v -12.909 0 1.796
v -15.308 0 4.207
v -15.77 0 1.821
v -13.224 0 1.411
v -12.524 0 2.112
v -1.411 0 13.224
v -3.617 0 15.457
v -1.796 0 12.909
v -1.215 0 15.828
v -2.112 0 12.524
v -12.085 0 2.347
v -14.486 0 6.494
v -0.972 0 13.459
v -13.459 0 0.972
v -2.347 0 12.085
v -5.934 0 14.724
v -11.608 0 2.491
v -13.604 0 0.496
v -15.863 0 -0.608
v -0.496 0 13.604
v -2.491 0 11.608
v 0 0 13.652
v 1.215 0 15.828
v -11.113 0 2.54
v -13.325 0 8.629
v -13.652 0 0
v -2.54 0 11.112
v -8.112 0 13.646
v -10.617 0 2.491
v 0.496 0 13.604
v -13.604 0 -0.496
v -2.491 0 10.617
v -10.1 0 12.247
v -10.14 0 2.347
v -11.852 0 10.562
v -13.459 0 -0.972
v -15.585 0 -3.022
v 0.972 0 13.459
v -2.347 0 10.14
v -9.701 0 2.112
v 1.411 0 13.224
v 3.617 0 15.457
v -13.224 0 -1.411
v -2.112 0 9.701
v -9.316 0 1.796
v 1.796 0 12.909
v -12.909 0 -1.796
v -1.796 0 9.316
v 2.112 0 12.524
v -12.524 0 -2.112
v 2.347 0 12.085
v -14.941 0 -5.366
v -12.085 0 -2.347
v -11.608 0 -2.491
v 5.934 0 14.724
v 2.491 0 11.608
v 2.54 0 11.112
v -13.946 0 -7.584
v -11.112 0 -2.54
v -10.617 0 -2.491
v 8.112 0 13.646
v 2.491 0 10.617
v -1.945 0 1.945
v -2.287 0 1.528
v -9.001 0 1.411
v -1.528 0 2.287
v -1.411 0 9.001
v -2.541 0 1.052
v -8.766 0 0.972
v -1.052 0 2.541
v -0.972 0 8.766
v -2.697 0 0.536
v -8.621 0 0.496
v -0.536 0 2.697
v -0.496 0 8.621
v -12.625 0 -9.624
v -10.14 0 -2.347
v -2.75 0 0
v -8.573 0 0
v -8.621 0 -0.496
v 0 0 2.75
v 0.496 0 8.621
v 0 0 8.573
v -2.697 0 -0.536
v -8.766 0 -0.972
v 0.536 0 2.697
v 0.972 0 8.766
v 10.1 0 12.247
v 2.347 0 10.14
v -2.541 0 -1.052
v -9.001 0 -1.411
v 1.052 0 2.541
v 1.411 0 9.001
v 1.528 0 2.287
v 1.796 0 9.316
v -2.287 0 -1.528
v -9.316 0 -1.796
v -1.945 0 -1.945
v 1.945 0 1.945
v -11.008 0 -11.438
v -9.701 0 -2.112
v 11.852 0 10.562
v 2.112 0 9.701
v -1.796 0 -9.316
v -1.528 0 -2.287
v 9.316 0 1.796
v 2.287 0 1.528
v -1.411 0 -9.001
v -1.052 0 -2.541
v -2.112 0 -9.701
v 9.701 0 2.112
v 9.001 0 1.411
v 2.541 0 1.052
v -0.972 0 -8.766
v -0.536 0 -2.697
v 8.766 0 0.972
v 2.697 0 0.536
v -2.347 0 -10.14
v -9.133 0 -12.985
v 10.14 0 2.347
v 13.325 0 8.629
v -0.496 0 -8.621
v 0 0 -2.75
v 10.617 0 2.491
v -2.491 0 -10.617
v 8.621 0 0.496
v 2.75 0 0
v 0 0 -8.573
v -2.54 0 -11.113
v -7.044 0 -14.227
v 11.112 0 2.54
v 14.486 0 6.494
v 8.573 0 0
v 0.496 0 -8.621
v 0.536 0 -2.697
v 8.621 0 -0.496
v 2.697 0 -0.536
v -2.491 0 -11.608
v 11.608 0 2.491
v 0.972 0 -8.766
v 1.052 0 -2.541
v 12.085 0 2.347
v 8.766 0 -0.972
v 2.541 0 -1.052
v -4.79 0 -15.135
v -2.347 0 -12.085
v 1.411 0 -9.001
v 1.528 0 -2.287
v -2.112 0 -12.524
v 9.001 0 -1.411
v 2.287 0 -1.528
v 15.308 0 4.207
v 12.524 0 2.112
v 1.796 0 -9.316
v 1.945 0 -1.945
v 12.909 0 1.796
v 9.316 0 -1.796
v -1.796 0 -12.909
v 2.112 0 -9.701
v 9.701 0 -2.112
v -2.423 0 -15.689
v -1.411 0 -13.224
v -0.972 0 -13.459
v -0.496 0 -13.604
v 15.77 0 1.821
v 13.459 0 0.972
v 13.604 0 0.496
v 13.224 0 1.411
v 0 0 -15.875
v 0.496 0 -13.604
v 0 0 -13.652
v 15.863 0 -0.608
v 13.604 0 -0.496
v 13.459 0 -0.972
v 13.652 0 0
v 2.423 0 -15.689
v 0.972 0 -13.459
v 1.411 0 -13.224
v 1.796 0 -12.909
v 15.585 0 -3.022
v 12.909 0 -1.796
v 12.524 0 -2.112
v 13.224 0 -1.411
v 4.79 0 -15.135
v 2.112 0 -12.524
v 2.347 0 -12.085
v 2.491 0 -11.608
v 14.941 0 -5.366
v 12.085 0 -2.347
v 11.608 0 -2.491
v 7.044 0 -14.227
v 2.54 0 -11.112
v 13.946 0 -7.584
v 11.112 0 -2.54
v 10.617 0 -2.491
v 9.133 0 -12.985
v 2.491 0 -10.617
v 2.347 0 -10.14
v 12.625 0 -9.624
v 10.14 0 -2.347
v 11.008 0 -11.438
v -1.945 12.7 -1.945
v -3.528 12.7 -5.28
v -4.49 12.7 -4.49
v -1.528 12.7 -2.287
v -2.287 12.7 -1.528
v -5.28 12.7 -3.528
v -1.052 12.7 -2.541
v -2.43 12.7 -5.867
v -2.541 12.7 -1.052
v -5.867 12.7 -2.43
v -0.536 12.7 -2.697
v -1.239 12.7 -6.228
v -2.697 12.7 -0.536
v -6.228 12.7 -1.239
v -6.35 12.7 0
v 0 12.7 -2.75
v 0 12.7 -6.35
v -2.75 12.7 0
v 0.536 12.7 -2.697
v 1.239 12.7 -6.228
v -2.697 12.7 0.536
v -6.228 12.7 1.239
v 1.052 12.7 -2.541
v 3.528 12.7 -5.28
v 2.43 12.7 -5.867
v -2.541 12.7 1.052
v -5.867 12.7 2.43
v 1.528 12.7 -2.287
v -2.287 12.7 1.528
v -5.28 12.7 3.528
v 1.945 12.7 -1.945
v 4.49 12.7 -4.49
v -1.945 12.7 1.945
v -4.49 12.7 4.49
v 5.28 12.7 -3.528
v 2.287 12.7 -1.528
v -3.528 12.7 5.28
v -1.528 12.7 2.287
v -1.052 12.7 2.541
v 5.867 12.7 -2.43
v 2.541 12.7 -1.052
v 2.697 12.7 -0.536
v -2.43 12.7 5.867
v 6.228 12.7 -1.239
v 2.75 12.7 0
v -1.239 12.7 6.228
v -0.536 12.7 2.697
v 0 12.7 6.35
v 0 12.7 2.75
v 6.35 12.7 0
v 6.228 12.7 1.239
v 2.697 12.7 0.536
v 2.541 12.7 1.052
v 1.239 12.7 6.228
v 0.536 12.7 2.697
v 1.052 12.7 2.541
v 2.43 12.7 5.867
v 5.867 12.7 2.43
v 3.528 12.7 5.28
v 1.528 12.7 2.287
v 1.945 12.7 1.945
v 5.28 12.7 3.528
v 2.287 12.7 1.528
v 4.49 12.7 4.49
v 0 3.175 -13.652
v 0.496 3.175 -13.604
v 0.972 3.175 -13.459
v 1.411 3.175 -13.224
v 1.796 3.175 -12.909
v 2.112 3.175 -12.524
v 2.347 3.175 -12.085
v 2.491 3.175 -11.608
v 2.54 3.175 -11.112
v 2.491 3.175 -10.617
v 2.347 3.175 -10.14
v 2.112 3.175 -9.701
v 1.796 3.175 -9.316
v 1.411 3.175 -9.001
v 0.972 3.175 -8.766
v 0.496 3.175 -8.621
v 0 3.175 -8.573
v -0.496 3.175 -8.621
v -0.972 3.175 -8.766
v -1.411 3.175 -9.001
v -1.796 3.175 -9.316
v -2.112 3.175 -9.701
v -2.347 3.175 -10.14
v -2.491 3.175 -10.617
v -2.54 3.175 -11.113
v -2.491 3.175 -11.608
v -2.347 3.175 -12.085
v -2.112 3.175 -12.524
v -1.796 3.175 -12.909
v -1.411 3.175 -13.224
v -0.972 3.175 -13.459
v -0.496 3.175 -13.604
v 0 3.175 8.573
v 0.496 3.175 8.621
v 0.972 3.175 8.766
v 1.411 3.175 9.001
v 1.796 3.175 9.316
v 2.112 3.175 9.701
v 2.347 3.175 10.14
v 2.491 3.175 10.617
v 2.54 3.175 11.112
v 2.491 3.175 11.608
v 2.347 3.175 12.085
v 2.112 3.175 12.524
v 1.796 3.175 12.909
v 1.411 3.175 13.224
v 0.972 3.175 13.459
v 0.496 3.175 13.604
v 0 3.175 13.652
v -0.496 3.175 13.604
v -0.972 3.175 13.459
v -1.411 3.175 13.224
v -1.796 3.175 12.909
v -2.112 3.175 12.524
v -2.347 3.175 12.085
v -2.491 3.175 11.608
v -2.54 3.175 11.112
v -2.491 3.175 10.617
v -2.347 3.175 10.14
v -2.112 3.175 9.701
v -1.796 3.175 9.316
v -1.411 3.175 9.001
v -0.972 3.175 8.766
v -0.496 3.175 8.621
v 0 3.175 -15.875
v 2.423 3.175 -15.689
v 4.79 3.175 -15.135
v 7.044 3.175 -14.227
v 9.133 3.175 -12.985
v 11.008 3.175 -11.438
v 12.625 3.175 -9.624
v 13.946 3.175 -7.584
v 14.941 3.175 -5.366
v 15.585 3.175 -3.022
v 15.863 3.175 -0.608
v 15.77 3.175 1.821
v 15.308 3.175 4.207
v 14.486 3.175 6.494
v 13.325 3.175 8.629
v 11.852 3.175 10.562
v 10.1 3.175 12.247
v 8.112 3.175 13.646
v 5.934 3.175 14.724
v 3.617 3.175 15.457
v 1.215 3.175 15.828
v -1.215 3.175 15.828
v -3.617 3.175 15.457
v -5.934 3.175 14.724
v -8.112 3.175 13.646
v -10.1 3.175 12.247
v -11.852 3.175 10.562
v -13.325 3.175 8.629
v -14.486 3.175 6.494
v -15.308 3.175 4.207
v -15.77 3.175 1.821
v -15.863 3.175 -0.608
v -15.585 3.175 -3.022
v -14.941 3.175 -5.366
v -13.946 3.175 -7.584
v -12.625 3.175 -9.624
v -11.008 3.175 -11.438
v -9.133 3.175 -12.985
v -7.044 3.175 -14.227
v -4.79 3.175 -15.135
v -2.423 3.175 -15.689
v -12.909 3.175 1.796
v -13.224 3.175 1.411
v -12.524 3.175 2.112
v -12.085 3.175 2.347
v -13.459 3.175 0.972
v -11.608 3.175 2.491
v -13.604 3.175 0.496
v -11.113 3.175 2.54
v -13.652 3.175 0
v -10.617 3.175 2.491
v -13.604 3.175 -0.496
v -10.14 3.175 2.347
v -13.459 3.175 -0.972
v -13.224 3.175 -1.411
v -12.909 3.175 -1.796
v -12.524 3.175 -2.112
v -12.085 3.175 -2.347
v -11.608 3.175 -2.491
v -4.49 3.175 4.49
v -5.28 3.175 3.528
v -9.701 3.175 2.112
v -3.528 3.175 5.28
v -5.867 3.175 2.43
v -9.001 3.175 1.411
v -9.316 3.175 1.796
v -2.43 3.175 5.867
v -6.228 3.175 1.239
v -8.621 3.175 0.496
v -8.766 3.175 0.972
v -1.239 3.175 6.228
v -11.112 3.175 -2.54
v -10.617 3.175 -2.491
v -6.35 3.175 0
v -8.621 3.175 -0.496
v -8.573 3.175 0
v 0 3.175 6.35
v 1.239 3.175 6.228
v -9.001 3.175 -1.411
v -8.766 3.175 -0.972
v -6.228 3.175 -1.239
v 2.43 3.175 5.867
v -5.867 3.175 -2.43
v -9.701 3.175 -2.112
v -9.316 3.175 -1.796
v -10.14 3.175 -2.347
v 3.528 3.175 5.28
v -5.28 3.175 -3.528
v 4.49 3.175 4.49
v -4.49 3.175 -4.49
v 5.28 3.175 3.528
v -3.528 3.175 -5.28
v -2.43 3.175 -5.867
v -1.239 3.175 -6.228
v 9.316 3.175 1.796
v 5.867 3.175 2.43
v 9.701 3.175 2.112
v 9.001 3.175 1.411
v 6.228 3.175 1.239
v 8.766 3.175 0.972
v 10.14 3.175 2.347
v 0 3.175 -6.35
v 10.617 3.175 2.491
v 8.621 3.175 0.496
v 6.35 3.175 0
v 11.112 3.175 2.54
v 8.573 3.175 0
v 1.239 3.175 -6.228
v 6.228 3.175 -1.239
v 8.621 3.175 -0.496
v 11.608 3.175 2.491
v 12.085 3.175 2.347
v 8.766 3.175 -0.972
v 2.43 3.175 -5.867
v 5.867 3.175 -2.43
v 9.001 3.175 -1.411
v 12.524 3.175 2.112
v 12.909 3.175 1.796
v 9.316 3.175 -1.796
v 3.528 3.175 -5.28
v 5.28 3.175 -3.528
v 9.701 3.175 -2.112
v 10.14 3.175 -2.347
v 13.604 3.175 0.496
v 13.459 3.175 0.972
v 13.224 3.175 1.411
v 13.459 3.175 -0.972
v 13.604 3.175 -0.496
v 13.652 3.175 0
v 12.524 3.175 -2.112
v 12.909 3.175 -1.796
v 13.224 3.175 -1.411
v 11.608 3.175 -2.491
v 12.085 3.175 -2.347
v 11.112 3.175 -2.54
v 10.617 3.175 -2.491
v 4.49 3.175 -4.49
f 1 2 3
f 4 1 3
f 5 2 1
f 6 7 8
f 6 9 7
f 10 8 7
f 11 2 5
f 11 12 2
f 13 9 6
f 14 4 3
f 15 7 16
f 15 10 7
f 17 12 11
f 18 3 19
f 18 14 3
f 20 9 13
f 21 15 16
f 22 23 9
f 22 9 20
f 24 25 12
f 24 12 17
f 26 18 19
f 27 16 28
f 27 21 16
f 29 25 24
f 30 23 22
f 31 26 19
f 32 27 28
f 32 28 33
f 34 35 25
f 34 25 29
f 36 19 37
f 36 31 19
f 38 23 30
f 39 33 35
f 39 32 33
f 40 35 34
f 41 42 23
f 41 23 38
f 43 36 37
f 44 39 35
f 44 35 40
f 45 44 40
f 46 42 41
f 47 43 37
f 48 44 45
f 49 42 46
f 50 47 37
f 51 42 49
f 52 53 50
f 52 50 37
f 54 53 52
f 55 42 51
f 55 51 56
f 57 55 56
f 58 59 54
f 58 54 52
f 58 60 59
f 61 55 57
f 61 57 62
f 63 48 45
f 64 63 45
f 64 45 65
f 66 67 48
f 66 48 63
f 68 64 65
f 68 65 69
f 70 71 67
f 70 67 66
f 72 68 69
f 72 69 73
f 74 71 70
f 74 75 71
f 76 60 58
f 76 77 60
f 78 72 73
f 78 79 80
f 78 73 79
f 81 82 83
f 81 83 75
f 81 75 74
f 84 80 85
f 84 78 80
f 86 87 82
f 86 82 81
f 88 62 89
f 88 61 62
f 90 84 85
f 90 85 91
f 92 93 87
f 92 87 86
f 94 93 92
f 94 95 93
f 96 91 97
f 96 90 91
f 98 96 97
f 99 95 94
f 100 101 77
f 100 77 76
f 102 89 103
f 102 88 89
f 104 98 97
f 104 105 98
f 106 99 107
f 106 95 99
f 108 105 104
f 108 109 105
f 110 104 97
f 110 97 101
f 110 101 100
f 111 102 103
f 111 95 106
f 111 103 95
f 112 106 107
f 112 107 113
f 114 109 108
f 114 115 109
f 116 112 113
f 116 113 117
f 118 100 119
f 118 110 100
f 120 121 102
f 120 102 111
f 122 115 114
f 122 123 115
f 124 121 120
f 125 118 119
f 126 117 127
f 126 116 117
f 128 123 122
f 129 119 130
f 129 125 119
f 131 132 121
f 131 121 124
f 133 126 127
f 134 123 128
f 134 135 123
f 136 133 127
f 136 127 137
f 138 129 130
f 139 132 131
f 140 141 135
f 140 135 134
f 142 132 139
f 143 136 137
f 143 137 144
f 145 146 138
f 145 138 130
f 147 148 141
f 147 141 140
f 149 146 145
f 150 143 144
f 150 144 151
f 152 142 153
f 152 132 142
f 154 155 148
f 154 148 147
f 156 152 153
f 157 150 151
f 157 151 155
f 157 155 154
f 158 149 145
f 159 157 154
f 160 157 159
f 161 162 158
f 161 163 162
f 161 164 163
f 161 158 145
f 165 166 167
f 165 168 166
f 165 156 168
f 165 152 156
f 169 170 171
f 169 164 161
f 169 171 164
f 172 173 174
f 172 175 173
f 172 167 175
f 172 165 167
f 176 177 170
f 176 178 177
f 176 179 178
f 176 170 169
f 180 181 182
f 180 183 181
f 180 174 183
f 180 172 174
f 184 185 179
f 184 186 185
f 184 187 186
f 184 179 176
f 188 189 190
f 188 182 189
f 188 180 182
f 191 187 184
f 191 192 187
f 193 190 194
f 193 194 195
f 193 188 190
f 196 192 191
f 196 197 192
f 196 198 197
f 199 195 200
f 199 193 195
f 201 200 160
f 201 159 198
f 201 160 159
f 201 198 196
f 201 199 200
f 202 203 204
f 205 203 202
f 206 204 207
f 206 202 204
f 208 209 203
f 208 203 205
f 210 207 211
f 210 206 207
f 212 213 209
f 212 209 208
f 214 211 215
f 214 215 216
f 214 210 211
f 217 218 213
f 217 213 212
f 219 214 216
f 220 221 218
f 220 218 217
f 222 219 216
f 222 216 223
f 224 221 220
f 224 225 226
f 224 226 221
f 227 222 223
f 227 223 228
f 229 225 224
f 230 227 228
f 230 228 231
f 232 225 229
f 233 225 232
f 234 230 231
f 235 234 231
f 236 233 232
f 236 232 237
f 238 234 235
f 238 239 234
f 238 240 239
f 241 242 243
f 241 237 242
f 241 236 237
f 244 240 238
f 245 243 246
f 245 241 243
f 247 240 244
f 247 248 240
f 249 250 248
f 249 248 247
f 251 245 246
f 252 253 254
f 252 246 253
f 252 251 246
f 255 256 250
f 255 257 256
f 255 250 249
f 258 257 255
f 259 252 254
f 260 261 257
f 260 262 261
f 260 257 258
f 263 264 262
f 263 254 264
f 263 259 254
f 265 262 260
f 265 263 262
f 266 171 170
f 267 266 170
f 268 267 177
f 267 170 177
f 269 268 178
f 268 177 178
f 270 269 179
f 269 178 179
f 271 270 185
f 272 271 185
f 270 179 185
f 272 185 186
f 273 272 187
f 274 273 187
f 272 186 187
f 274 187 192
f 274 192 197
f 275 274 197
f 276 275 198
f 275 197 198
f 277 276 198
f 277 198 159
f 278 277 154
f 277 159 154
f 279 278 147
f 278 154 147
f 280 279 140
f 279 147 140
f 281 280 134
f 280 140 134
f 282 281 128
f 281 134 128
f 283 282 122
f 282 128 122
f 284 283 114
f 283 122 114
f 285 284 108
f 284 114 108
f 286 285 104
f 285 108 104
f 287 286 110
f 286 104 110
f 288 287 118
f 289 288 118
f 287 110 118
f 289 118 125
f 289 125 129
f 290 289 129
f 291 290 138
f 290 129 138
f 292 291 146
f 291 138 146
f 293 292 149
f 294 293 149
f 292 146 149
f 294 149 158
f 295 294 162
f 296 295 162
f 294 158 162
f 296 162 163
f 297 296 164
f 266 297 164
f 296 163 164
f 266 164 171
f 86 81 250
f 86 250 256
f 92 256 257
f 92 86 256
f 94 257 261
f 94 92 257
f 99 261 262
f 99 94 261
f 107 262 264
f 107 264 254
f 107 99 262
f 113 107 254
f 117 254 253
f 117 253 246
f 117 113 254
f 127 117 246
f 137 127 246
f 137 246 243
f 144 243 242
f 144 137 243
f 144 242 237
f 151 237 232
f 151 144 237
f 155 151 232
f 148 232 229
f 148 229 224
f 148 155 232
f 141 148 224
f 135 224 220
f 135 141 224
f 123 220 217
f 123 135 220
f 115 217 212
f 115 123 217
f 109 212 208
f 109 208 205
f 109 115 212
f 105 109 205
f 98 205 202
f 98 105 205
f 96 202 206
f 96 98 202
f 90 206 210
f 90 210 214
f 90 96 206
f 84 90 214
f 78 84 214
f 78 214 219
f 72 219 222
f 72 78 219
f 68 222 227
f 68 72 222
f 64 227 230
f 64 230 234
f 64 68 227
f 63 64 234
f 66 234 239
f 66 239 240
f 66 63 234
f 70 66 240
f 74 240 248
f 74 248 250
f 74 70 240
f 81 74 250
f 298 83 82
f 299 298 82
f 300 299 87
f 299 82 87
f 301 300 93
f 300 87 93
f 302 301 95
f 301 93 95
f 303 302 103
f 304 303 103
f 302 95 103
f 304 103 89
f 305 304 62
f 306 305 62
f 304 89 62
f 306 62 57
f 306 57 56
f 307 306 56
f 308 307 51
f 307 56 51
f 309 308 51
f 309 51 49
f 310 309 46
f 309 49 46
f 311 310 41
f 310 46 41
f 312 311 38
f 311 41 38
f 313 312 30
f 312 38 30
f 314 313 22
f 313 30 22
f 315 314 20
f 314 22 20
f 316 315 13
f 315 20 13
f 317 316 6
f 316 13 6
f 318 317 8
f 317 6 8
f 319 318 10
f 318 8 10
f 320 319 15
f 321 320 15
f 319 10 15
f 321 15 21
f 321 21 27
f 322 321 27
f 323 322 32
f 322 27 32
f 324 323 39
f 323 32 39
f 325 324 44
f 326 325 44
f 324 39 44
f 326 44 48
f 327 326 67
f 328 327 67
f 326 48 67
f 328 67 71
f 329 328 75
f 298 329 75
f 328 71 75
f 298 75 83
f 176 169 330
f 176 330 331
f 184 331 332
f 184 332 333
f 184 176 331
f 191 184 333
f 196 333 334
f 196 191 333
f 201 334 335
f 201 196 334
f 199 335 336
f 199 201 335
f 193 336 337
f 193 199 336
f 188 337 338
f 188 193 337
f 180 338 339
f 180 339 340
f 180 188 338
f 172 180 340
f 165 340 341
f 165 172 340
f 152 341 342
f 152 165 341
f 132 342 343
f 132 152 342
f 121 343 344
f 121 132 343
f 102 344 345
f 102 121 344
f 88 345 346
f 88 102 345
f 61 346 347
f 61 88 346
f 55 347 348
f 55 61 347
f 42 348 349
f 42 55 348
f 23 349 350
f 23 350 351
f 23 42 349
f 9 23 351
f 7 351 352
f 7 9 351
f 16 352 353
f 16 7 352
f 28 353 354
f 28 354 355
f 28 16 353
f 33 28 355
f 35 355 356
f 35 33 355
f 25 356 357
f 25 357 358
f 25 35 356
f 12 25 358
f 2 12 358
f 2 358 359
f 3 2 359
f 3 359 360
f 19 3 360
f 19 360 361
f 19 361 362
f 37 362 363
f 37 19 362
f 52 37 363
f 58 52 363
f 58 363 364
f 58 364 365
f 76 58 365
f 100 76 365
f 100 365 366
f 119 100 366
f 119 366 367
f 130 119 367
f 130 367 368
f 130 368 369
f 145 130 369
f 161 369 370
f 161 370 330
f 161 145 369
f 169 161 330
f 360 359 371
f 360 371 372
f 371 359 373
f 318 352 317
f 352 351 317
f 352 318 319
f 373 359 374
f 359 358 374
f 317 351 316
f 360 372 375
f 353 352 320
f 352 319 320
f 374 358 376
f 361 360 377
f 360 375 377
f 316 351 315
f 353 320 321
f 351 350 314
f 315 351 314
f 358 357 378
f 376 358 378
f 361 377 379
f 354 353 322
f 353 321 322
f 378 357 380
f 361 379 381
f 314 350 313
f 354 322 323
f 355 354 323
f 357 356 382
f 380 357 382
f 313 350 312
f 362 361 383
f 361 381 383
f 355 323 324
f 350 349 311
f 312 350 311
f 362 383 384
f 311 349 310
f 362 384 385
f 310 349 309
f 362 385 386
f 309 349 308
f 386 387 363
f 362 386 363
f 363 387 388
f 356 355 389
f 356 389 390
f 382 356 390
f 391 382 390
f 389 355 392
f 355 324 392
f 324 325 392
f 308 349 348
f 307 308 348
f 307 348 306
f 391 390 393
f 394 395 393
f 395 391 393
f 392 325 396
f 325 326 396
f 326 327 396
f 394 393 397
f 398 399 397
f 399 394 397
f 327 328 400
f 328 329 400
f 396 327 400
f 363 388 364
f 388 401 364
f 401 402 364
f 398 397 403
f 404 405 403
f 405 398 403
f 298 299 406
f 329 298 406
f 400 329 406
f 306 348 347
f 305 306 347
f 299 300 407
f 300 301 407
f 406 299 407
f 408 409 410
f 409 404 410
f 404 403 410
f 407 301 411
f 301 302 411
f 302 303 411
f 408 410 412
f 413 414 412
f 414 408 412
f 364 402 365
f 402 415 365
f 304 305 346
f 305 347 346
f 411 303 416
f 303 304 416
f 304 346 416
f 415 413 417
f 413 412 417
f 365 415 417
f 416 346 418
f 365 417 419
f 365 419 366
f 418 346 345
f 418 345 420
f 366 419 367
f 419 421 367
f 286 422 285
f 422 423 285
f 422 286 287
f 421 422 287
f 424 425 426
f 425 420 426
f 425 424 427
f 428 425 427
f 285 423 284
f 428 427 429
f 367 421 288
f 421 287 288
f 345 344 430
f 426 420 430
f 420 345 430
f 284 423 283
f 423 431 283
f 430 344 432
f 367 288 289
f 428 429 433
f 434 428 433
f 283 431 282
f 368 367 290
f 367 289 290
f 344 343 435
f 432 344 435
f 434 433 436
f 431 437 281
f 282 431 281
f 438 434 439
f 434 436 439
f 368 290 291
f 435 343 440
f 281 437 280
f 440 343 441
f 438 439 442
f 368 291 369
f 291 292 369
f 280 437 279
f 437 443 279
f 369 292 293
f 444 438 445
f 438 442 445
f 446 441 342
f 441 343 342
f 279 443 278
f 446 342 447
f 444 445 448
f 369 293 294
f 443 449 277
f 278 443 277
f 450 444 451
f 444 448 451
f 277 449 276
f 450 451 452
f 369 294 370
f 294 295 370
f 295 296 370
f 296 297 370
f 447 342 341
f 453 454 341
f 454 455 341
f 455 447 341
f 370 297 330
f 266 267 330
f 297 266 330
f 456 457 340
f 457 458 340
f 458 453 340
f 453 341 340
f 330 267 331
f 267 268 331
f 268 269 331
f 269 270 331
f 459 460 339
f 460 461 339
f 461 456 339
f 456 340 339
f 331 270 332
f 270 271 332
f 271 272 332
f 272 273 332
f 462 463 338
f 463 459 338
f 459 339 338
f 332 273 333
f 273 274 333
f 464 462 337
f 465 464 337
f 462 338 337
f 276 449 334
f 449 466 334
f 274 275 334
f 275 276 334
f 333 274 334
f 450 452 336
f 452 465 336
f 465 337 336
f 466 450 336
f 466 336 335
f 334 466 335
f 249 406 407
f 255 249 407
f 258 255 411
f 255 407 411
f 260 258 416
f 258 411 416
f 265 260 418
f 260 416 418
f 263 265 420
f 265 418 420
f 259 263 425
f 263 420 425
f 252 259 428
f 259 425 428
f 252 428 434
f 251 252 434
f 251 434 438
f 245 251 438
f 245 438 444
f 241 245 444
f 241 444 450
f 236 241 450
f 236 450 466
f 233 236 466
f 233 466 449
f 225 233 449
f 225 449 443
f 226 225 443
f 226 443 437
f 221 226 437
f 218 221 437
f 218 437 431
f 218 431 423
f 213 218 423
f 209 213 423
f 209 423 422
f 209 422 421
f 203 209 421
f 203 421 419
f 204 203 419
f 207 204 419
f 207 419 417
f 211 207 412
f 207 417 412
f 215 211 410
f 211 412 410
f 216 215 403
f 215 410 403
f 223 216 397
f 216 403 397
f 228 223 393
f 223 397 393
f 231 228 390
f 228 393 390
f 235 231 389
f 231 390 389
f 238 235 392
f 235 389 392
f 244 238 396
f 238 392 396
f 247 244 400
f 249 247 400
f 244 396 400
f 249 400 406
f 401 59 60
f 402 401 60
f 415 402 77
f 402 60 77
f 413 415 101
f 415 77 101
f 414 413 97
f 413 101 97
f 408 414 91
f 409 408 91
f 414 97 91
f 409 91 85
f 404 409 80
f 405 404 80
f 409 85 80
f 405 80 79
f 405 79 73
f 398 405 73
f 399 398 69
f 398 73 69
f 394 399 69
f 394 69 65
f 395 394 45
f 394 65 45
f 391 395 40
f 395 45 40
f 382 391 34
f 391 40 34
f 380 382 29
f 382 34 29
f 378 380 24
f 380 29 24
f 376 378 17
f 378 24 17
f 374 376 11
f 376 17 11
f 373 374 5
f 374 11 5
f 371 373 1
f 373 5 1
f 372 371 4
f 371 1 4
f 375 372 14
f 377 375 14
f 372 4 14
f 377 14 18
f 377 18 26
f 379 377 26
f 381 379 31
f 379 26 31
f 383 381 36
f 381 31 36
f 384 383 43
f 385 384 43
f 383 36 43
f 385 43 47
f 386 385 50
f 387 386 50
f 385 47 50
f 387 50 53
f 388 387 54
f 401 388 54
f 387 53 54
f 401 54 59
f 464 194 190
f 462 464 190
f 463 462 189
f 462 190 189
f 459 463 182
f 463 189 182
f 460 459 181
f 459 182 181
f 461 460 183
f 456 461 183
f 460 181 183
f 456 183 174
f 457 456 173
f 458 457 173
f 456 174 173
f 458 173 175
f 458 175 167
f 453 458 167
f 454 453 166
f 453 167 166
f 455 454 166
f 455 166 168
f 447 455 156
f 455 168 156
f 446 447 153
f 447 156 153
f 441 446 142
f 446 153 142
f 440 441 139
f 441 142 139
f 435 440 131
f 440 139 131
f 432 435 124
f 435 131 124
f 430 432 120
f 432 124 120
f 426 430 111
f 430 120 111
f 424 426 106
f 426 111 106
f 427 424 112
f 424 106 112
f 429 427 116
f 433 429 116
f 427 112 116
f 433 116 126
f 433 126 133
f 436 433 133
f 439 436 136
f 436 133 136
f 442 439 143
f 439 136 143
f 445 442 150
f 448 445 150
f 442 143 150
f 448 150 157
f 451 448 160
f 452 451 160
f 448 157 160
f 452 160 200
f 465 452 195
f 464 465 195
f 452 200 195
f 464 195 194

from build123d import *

# Parameters (mm, degrees)
SKETCH1_R           = 6.35
SKETCH1_R_2         = 2.75
BOSS_EXTRUDE1_DEPTH = 12.7
SKETCH2_R           = 15.875
SKETCH2_R_2         = 2.54
SKETCH2_R_3         = 6.35
BOSS_EXTRUDE2_DEPTH = 3.175


with BuildPart() as part:
    # Sketch1 → Boss-Extrude1 (new body)
    with BuildSketch(Plane(origin=(0, 0, 0), x_dir=(1, 0, 0), z_dir=(0, 1, 0))):
        with Locations(Location((0, 0, 0), (0, 0, 270))):
            Circle(SKETCH1_R)
        with Locations(Location((0, 0, 0), (0, 0, 270))):
            Circle(SKETCH1_R_2, mode=Mode.SUBTRACT)
    extrude(amount=BOSS_EXTRUDE1_DEPTH)

    # Sketch2 → Boss-Extrude2 (add)
    with BuildSketch(Plane.XZ):
        with Locations(Location((0, 0, 0), (0, 0, 270))):
            Circle(SKETCH2_R)
        with Locations(Location((0, 11.1125, 0), (0, 0, 270))):
            Circle(SKETCH2_R_2, mode=Mode.SUBTRACT)
        with Locations(Location((0, 0, 0), (0, 0, 270))):
            Circle(SKETCH2_R_3, mode=Mode.SUBTRACT)
        with Locations(Location((11.1125, 0, 0), (0, 0, 270))):
            Circle(SKETCH2_R_2, mode=Mode.SUBTRACT)
        with Locations(Location((0, -11.1125, 0), (0, 0, 270))):
            Circle(SKETCH2_R_2, mode=Mode.SUBTRACT)
        with Locations(Location((-11.1125, 0, 0), (0, 0, 270))):
            Circle(SKETCH2_R_2, mode=Mode.SUBTRACT)
    extrude(amount=-BOSS_EXTRUDE2_DEPTH)


solid = part.part
